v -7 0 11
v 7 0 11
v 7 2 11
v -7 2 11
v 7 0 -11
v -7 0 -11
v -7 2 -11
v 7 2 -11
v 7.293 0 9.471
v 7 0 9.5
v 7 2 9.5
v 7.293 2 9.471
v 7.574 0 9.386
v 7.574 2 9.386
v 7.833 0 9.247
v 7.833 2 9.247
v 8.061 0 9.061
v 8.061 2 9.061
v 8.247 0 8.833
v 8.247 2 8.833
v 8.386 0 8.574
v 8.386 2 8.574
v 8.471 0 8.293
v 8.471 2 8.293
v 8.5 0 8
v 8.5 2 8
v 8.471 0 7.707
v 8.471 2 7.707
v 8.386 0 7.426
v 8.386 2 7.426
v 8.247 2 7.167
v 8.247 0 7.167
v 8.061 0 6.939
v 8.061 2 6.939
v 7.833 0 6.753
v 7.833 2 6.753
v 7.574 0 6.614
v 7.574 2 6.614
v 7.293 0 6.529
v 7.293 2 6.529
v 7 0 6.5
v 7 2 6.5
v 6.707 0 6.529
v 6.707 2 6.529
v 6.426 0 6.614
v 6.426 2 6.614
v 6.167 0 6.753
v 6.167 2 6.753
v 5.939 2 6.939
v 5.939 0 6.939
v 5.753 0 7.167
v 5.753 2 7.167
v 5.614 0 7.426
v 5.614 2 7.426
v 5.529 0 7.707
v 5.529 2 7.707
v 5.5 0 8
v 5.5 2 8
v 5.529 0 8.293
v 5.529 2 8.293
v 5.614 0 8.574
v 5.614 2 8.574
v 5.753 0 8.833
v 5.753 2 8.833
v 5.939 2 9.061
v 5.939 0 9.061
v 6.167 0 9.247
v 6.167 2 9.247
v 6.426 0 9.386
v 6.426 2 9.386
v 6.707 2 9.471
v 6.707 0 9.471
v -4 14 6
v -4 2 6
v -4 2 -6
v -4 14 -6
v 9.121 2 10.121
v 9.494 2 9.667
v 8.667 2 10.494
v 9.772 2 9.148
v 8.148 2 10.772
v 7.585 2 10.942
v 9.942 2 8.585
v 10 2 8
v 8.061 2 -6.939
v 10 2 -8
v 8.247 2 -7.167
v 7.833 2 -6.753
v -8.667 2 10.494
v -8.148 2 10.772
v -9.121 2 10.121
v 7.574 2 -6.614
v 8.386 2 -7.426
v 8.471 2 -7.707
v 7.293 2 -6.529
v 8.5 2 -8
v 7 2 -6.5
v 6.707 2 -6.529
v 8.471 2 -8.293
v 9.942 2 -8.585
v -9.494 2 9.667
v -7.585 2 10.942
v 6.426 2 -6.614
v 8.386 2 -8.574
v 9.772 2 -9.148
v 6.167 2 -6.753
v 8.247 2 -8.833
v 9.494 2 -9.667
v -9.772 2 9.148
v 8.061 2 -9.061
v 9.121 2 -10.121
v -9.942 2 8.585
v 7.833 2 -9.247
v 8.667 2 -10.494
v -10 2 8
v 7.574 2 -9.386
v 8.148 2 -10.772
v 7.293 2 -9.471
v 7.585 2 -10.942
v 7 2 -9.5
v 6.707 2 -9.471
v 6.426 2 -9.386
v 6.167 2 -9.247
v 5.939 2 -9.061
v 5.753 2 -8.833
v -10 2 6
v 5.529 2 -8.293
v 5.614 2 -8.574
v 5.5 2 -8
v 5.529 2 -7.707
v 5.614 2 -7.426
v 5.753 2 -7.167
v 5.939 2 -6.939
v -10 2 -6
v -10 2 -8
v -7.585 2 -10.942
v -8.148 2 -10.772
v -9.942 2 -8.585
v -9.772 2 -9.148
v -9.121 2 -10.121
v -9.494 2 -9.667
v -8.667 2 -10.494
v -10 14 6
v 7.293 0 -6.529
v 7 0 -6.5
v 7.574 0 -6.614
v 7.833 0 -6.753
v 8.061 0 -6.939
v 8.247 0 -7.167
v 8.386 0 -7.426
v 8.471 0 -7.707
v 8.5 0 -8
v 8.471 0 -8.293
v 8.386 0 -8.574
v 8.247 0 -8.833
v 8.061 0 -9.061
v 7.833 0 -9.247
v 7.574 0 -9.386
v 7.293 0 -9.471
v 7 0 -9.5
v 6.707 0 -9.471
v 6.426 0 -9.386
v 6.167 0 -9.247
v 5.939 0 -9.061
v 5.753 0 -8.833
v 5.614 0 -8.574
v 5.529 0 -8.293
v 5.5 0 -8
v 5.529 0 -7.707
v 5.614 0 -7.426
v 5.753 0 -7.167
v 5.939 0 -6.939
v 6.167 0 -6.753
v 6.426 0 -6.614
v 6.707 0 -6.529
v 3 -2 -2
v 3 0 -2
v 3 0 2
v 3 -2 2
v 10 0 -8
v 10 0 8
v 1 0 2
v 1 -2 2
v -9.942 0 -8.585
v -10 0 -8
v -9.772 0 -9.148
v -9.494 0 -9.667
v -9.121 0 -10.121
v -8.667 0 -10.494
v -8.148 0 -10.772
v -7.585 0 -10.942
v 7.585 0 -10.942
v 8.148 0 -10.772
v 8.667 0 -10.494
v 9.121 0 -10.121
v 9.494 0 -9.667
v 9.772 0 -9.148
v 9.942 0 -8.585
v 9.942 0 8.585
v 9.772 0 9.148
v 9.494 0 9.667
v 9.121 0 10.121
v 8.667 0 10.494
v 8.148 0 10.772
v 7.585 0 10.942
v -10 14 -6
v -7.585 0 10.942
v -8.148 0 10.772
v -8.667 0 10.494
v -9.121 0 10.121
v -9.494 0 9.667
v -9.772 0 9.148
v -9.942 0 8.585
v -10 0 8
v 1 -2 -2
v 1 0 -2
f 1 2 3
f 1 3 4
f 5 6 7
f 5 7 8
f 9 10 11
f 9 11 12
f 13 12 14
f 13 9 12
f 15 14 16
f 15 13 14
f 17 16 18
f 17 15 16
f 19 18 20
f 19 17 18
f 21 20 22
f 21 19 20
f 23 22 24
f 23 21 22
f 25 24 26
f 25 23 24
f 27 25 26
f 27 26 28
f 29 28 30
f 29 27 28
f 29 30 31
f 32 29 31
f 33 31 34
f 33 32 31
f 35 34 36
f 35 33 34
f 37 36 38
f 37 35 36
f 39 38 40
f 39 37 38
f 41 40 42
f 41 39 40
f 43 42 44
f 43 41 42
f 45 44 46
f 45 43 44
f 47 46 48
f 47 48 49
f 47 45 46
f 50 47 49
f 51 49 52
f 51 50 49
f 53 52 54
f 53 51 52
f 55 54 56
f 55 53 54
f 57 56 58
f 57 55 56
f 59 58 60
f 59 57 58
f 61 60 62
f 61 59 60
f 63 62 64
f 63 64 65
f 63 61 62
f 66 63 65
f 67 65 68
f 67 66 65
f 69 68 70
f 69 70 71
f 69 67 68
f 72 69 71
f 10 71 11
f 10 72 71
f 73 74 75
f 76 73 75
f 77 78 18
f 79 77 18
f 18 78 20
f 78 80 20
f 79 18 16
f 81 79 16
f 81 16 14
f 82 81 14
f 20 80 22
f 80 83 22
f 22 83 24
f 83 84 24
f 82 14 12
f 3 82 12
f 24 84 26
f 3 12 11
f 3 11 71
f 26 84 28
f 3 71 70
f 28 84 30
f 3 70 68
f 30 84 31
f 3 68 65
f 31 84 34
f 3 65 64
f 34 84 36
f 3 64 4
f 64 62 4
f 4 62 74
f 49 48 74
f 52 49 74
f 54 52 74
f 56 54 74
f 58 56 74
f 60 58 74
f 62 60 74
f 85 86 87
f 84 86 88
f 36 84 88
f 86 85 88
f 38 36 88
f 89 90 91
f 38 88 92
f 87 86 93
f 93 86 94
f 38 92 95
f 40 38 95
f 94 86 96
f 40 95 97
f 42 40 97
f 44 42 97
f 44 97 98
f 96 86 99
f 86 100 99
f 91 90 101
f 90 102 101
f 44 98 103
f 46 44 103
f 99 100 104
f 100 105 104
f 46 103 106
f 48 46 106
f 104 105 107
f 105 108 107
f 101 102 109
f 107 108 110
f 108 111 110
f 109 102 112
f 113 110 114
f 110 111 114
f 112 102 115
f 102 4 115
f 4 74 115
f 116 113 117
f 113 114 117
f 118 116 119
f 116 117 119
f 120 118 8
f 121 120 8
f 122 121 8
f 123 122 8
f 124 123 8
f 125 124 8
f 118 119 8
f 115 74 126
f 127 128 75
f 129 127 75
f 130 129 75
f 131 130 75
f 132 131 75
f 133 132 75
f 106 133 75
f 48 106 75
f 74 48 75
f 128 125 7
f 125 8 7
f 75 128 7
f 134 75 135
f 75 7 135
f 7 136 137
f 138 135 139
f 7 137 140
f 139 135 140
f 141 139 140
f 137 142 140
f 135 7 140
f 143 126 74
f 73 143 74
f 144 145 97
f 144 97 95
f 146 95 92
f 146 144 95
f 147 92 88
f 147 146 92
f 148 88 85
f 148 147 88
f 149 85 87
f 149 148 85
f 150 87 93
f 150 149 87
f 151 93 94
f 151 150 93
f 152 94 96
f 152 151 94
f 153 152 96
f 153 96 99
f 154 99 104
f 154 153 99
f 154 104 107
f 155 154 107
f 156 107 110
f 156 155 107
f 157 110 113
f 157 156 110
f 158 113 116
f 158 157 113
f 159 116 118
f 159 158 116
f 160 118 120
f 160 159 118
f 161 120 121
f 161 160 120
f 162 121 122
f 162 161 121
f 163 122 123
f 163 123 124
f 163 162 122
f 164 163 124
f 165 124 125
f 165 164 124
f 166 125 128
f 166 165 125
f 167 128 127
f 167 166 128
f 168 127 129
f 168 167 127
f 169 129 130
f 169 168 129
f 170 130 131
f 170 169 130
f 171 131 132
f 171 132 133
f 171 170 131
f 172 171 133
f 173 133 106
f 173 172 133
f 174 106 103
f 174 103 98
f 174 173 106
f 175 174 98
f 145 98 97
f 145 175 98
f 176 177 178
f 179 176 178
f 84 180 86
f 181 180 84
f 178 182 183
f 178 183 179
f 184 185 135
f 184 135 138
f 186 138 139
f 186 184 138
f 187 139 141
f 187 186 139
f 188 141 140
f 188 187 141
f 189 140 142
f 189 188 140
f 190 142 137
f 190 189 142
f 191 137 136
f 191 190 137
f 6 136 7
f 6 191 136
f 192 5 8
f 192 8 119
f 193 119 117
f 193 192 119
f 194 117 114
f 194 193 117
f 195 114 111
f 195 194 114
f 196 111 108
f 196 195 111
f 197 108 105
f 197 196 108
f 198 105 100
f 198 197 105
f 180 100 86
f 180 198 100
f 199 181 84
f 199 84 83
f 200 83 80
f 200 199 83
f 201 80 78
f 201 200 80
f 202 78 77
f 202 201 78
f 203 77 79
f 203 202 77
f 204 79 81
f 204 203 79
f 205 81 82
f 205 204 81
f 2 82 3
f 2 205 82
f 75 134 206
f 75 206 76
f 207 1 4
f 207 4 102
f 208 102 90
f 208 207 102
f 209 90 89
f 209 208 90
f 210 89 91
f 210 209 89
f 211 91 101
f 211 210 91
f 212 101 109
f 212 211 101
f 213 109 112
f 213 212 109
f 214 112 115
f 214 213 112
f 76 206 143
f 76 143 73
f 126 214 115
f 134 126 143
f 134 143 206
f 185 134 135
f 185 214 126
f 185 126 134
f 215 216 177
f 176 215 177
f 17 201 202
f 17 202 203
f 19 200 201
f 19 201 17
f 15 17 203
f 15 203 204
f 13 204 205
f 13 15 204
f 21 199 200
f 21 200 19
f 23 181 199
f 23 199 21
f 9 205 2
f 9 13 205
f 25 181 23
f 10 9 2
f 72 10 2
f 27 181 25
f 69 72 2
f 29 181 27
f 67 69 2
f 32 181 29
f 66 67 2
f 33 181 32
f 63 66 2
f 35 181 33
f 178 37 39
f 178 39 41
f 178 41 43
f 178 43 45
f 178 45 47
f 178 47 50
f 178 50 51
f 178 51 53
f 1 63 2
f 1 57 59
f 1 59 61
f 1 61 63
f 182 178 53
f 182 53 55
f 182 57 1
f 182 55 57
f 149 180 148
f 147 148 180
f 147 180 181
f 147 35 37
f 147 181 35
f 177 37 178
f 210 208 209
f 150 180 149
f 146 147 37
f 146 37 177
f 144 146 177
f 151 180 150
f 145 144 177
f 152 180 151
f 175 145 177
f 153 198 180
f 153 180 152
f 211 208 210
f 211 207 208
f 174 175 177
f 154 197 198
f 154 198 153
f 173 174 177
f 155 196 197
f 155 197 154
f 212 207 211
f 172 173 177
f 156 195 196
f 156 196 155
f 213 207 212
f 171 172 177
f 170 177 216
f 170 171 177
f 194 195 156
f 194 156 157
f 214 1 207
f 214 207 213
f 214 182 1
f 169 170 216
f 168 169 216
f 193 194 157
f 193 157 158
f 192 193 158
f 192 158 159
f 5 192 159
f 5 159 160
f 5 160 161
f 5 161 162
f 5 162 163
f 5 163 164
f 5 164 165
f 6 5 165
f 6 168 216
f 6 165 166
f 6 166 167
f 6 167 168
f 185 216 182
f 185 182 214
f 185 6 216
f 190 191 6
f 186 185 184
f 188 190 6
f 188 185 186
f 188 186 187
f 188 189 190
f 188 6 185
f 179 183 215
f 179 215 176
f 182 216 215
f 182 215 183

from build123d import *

# Parameters (mm, degrees)
SKETCH1_R           = 1.5
BOSS_EXTRUDE1_DEPTH = 2
SKETCH2_W           = 6
SKETCH2_H           = 12
BOSS_EXTRUDE2_DEPTH = 12
SKETCH3_W           = 2
SKETCH3_H           = 4
BOSS_EXTRUDE3_DEPTH = 2


with BuildPart() as part:
    # Sketch1 → Boss-Extrude1 (new body)
    with BuildSketch(Plane(origin=(0, 0, 0), x_dir=(1, 0, 0), z_dir=(0, 1, 0))):
        with BuildLine():
            Line((-7, 11), (7, 11))
            ThreePointArc((7, 11), (9.121320344, 10.121320344), (10, 8))
            Line((10, 8), (10, -8))
            ThreePointArc((10, -8), (9.121320344, -10.121320344), (7, -11))
            Line((7, -11), (-7, -11))
            ThreePointArc((-7, -11), (-9.121320344, -10.121320344), (-10, -8))
            Line((-10, -8), (-10, 8))
            ThreePointArc((-10, 8), (-9.121320344, 10.121320344), (-7, 11))
        make_face()
        with Locations(Location((7, 8, 0), (0, 0, 270))):
            Circle(SKETCH1_R, mode=Mode.SUBTRACT)
        with Locations(Location((7, -8, 0), (0, 0, 270))):
            Circle(SKETCH1_R, mode=Mode.SUBTRACT)
    extrude(amount=BOSS_EXTRUDE1_DEPTH)

    # Sketch2 → Boss-Extrude2 (add)
    with BuildSketch(Plane(origin=(0, 2, 0), x_dir=(1, 0, 0), z_dir=(0, 1, 0))):
        with Locations((-7, 0)):
            Rectangle(SKETCH2_W, SKETCH2_H)
    extrude(amount=BOSS_EXTRUDE2_DEPTH)

    # Sketch3 → Boss-Extrude3 (add)
    with BuildSketch(Plane.XZ):
        with Locations((2, 0)):
            Rectangle(SKETCH3_W, SKETCH3_H)
    extrude(amount=BOSS_EXTRUDE3_DEPTH)


solid = part.part
